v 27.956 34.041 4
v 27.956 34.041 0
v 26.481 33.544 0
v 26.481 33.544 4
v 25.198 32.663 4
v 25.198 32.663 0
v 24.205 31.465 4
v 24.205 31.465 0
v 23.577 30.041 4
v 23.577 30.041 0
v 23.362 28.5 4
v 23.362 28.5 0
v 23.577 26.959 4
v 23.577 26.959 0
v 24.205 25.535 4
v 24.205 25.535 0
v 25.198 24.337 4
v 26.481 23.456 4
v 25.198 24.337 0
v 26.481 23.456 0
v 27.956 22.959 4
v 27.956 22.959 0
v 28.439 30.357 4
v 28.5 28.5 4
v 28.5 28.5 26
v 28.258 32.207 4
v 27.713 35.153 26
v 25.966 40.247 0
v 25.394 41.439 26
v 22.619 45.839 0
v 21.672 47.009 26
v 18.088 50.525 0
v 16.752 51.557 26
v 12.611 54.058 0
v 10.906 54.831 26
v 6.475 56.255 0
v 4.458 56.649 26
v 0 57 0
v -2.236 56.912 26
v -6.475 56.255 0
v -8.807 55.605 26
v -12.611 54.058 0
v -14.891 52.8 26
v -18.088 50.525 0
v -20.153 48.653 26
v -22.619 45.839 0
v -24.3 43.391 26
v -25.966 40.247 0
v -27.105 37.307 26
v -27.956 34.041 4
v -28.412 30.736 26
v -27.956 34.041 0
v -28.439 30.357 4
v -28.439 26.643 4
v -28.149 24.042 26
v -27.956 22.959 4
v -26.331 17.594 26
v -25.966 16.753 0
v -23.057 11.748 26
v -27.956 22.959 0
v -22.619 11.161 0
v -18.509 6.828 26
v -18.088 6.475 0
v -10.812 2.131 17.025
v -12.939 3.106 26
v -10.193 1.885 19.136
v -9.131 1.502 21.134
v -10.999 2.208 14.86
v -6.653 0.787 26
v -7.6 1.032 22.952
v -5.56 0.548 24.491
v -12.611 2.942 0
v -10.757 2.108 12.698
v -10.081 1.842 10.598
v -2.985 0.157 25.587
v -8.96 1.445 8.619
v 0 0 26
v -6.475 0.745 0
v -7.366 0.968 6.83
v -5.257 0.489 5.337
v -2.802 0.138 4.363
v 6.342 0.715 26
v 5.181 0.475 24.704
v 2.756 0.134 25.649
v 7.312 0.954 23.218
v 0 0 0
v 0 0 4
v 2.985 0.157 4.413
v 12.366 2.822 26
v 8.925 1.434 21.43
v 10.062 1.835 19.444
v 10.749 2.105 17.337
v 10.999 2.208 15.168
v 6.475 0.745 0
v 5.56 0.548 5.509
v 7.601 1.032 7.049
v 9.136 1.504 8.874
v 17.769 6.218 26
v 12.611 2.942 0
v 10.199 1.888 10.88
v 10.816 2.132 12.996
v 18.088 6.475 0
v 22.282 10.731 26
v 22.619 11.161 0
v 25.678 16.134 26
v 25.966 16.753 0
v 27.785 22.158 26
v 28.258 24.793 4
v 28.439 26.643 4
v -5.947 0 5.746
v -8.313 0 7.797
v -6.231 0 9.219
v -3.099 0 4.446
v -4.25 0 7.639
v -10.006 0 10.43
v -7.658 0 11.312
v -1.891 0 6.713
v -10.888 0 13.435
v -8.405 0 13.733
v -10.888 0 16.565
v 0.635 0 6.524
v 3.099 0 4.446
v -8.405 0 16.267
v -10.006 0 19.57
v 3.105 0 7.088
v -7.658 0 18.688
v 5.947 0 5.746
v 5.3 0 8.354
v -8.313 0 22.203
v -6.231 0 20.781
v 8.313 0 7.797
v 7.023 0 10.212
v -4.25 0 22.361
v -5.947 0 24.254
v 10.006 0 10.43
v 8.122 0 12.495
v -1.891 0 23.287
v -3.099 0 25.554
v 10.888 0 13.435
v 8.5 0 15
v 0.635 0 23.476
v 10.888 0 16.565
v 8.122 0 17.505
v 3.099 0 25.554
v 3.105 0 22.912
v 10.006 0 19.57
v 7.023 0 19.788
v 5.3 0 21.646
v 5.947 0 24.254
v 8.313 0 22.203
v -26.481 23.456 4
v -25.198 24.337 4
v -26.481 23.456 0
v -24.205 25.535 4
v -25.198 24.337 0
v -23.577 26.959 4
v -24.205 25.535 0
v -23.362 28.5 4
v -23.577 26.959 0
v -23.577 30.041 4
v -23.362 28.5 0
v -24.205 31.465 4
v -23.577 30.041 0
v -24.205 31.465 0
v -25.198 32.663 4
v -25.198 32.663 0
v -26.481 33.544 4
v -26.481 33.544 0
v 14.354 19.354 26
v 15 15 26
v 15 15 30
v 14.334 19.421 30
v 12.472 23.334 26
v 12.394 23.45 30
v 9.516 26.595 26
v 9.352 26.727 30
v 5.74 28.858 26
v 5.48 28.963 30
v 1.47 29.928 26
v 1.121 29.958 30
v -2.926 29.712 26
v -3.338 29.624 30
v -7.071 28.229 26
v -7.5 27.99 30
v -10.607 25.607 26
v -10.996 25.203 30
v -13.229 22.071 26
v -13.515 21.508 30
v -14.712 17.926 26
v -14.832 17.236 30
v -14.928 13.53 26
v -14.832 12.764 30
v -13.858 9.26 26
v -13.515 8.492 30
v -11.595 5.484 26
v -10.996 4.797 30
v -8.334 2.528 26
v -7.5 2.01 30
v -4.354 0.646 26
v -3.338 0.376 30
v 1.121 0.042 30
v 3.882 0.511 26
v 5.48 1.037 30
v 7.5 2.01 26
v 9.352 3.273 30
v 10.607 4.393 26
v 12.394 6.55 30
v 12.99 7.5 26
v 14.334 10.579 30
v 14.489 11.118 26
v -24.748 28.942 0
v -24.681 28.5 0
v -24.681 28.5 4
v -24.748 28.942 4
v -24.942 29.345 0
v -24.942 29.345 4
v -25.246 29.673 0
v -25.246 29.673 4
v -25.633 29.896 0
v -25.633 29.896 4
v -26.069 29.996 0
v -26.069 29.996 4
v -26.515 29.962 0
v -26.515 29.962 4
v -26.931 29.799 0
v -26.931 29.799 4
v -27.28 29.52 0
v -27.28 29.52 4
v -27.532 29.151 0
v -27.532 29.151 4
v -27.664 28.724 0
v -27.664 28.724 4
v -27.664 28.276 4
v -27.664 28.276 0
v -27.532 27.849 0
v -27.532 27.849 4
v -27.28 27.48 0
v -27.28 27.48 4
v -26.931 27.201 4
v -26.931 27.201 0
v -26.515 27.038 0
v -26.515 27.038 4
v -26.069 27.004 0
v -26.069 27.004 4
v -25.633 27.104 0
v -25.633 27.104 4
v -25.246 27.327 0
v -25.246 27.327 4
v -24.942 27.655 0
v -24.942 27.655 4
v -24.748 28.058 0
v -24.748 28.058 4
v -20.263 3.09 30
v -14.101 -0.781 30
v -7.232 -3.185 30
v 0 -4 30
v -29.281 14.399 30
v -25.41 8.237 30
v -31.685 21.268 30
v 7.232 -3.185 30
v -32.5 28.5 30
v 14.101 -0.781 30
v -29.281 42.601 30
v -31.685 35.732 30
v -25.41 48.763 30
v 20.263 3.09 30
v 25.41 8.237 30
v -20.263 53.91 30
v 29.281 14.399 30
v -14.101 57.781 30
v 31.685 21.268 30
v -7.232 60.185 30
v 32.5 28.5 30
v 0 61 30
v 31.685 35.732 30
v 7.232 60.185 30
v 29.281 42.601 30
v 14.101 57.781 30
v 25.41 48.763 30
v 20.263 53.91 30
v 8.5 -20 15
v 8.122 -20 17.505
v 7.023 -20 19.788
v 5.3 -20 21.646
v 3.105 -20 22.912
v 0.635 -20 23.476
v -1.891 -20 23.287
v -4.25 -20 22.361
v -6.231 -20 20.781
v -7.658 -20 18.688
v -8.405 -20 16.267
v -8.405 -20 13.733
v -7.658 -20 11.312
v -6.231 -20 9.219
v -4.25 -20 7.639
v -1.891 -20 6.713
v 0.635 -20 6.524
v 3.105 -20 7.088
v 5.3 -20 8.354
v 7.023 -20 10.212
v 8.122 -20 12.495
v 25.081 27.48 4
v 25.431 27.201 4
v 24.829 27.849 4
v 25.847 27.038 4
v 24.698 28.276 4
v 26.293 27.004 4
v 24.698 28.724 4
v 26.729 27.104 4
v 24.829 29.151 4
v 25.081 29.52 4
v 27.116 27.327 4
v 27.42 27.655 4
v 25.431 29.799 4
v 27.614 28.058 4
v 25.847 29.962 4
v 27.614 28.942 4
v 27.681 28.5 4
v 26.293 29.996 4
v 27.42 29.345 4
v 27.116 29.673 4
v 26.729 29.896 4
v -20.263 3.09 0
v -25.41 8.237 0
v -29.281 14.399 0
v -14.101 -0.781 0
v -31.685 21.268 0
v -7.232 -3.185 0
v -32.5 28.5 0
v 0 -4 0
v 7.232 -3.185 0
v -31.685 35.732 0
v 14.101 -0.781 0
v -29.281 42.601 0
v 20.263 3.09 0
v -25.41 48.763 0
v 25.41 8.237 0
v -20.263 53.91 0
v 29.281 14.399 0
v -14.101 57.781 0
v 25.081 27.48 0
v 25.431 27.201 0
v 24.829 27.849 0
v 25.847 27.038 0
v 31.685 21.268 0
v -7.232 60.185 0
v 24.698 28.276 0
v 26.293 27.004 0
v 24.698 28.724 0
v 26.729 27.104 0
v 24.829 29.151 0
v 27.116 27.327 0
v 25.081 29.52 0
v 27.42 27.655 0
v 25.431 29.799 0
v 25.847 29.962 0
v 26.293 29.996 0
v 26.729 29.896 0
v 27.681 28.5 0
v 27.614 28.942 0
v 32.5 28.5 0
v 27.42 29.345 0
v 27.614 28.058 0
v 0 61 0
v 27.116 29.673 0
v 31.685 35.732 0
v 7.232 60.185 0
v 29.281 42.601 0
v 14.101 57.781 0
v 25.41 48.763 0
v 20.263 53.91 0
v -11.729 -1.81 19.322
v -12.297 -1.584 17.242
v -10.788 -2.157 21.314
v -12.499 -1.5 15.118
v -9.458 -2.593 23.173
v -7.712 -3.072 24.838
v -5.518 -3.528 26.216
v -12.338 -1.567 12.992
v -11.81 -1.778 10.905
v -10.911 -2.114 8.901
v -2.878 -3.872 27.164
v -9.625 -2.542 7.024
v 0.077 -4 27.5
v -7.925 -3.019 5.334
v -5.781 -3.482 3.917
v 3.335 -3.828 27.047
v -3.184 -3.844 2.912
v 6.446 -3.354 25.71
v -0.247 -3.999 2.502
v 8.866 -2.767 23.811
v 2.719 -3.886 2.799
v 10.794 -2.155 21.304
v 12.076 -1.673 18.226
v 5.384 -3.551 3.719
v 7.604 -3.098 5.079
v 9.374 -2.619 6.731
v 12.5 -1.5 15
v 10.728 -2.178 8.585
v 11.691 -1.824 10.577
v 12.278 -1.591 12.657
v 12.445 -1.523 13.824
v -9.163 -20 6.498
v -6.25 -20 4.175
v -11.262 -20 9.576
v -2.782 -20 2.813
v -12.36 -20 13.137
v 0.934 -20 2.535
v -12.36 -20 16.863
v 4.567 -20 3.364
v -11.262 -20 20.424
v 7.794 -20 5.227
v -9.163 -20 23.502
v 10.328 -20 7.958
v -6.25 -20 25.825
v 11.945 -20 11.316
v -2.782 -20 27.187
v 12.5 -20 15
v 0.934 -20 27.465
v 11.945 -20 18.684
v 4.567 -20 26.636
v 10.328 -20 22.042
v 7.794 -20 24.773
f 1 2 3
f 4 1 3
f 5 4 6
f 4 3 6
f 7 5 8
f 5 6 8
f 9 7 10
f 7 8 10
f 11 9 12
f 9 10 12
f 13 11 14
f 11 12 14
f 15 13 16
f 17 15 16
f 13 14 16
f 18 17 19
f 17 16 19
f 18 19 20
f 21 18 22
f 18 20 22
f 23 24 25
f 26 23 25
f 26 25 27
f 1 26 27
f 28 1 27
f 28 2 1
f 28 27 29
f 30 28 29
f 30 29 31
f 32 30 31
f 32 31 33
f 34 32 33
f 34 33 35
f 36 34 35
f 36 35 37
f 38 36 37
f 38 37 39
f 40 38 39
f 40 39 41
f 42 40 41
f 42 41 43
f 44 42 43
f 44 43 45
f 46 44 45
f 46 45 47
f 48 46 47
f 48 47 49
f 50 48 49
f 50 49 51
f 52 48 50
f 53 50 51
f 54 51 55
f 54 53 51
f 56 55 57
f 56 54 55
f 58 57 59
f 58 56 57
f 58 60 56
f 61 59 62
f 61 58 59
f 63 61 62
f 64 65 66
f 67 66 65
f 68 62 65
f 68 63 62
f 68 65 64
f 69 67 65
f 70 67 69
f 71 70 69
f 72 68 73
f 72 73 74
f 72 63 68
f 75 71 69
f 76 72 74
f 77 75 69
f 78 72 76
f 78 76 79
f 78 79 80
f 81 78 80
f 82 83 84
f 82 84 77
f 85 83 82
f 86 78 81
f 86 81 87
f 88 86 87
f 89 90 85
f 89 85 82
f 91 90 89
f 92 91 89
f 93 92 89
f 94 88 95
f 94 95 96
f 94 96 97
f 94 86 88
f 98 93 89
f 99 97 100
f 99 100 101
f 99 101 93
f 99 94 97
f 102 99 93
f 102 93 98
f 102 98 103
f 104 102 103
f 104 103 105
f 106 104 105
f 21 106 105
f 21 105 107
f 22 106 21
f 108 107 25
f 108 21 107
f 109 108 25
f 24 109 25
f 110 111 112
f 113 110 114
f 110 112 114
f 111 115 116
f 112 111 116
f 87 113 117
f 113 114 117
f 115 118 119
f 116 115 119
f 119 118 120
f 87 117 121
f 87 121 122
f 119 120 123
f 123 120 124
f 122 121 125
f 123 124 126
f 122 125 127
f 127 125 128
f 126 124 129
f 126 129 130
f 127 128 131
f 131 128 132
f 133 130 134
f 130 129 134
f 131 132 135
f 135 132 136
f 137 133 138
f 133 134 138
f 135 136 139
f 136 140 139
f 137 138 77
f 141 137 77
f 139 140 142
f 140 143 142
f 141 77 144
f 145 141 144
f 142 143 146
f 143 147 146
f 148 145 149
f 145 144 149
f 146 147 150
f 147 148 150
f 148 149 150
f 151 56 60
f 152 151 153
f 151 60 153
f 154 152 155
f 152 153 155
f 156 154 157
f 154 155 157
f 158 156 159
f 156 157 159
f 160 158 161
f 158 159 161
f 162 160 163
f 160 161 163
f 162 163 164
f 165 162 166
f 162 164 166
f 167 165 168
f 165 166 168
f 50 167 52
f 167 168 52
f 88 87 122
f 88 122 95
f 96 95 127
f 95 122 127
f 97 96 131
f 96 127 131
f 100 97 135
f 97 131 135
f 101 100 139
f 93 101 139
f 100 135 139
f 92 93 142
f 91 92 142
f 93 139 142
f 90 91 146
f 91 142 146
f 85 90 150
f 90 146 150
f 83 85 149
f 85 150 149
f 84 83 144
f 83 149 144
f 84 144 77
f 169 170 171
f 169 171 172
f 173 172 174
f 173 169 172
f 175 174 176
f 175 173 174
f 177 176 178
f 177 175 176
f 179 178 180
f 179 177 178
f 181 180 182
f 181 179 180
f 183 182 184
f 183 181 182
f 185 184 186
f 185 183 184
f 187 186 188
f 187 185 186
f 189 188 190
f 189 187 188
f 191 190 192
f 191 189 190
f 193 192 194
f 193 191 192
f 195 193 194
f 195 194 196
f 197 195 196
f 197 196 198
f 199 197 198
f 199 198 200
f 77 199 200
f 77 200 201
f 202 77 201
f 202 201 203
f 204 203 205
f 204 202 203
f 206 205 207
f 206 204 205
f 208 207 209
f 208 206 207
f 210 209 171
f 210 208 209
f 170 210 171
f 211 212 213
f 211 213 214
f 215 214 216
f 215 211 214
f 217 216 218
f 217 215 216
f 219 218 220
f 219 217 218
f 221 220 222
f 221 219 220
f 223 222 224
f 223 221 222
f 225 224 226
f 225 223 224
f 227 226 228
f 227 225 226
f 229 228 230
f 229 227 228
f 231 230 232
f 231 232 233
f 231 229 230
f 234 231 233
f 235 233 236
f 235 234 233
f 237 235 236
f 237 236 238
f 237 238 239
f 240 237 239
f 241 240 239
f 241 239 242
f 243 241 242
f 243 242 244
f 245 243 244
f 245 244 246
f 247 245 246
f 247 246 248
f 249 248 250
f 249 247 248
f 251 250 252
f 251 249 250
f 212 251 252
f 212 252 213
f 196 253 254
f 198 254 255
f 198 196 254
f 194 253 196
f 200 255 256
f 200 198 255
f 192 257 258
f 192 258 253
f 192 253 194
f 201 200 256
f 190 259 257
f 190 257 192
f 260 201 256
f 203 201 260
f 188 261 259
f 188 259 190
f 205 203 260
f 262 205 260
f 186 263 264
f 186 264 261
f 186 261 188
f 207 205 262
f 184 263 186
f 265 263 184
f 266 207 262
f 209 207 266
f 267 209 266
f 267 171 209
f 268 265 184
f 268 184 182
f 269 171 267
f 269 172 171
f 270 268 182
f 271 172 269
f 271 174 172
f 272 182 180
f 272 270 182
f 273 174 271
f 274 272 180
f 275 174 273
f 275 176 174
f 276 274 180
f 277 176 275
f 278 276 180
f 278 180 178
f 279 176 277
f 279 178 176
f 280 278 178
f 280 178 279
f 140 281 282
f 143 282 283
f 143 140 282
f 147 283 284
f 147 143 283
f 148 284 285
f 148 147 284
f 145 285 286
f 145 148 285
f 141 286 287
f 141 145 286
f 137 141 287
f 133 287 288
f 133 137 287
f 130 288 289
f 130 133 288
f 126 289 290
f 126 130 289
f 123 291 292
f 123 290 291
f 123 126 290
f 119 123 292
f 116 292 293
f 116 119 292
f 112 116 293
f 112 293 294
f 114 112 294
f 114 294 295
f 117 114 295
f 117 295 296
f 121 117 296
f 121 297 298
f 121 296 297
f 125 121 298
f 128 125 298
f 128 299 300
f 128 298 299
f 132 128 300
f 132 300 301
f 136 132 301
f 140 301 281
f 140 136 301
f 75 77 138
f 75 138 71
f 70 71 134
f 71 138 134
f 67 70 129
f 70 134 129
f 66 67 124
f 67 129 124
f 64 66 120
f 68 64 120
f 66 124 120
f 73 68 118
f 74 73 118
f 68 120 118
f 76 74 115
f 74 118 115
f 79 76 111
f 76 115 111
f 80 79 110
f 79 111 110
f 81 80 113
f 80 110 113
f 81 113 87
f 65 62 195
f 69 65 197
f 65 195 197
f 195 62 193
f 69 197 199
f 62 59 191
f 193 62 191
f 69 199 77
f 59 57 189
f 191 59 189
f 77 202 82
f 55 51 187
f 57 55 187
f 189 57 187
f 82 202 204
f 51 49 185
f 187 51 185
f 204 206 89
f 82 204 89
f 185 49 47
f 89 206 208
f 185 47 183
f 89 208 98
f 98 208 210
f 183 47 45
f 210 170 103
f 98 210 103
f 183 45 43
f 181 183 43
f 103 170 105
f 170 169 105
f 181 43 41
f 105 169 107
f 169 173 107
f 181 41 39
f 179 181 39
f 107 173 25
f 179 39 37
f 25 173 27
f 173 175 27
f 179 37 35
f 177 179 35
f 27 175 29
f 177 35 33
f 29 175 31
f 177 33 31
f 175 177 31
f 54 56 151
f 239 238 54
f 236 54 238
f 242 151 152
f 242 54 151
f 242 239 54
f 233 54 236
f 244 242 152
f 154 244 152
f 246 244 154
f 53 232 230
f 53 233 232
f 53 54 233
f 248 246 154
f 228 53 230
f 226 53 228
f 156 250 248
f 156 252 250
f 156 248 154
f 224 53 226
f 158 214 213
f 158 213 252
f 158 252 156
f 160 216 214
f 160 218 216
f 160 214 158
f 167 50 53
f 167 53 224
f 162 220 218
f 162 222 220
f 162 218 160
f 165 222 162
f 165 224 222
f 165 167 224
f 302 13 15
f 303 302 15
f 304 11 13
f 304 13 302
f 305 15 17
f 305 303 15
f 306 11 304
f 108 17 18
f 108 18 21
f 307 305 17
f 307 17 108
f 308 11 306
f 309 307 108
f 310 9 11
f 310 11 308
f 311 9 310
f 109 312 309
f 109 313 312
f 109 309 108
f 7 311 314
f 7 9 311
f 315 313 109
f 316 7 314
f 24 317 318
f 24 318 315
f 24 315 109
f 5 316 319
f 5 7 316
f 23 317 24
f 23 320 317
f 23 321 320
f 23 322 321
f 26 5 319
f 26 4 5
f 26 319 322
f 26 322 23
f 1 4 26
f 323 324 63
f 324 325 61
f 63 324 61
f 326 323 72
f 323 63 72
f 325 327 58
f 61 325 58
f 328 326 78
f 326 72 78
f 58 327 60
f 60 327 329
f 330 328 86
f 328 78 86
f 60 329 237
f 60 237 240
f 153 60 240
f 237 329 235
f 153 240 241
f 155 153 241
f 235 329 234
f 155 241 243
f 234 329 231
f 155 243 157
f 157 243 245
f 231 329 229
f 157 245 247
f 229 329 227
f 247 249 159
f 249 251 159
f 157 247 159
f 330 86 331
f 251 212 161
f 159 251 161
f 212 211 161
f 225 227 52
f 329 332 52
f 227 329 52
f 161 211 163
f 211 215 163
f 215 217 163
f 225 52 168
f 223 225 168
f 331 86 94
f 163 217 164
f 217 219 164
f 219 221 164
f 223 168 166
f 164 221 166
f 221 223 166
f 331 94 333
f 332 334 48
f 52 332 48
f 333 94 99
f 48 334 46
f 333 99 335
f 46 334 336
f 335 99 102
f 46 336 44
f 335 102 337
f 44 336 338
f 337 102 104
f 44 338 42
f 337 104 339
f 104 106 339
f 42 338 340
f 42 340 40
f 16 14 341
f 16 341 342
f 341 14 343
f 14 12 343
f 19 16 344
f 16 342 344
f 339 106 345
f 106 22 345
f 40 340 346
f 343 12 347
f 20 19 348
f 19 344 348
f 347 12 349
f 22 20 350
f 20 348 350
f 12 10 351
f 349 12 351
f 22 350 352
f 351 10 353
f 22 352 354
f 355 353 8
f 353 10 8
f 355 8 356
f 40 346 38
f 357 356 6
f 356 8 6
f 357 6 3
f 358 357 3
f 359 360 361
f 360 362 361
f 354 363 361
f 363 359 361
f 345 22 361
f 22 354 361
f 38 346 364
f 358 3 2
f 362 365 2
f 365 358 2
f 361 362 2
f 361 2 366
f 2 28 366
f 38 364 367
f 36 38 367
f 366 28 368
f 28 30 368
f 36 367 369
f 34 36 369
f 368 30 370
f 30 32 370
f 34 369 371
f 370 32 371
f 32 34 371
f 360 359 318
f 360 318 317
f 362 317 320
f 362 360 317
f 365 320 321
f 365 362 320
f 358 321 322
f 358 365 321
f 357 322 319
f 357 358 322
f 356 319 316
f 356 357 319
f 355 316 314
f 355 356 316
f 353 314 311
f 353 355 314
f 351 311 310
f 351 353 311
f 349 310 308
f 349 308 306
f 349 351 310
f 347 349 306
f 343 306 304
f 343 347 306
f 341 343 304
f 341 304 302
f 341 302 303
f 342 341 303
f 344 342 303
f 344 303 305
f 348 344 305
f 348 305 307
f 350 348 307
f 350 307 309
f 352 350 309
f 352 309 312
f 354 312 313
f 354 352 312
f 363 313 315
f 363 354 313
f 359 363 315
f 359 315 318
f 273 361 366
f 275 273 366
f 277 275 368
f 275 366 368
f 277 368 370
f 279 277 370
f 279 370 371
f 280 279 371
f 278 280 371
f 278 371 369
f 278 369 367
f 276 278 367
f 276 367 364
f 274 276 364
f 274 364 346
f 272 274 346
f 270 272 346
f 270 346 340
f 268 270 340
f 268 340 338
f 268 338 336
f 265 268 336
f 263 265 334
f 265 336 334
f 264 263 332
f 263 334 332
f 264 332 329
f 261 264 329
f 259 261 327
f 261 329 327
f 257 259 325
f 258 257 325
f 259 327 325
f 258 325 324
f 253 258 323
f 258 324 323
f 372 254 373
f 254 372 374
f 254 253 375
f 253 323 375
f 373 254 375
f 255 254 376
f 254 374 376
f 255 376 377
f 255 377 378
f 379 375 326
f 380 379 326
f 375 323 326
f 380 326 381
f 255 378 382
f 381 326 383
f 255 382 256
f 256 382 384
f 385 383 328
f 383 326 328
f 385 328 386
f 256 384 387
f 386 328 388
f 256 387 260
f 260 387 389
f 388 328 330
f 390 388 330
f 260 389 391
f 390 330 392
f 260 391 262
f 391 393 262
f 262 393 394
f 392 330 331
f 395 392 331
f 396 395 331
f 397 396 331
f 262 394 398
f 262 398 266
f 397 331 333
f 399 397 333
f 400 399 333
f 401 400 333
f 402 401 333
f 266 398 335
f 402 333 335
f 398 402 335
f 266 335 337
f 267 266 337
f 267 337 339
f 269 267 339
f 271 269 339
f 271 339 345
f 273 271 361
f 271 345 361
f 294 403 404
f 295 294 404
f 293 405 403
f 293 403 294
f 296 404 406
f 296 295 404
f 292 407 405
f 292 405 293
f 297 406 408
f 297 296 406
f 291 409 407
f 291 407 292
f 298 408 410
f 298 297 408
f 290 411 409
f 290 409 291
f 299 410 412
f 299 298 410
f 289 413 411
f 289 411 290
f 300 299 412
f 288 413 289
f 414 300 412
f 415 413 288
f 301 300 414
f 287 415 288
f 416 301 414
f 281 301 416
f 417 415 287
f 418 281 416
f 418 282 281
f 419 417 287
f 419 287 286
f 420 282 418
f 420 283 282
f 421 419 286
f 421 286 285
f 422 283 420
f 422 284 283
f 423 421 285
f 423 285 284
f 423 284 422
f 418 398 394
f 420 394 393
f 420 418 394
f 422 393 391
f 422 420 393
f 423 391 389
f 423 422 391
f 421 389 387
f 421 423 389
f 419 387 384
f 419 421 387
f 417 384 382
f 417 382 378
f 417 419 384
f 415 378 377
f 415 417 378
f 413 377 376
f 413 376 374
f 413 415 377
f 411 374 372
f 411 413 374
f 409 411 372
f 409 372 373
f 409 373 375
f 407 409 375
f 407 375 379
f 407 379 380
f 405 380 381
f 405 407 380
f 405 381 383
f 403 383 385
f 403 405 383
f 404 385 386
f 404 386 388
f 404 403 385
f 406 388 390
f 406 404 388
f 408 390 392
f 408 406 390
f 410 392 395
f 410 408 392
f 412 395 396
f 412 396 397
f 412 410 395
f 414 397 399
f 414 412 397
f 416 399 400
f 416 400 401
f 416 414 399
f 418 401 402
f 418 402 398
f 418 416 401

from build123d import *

# Parameters (mm, degrees)
F0_R      = 12.5
F1_DEPTH  = 20
F2_R      = 32.5
F3_DEPTH  = 30
F4_R      = 28.5
F5_DEPTH  = 26
F6_R      = 11
F7_DEPTH  = 19.5
F8_R      = 15
F9_DEPTH  = 44.3
F10_R     = 8.5
F11_DEPTH = 41.2
F12_R     = 1.5
F13_DEPTH = 4


with BuildPart() as f1:
    # F0 (on Front) → F1 (new body, symmetric)
    with BuildSketch(Plane.XZ):
        with Locations((0, 15)):
            Circle(F0_R)
    extrude(amount=F1_DEPTH, both=True)

    # F2 (on Top) → F3 (join)
    with BuildSketch(Plane.XY):
        with Locations((0, 28.5)):
            Circle(F2_R)
    extrude(amount=F3_DEPTH)

    # F4 (on Top) → F5 (cut)
    with BuildSketch(Plane.XY):
        with Locations((0, 28.5)):
            Circle(F4_R)
    extrude(amount=F5_DEPTH, mode=Mode.SUBTRACT)

    # F6 (on Front) → F7 (cut)
    with BuildSketch(Plane.XZ):
        with Locations((0, 15)):
            Circle(F6_R)
    extrude(amount=-F7_DEPTH, mode=Mode.SUBTRACT)

    # F8 (on Top) → F9 (cut)
    with BuildSketch(Plane.XY):
        with Locations((0, 15)):
            Circle(F8_R)
    extrude(amount=F9_DEPTH, mode=Mode.SUBTRACT)

    # F10 (on Front) → F11 (cut)
    with BuildSketch(Plane.XZ):
        with Locations((0, 15)):
            Circle(F10_R)
    extrude(amount=F11_DEPTH, mode=Mode.SUBTRACT)

    # F12 (on Top) → F13 (join)
    with BuildSketch(Plane.XY):
        with BuildLine():
            Line((29, 28.5), (29, 34.138157))
            ThreePointArc((29, 34.138157), (23.361843, 28.5), (29, 22.861843))
            Line((29, 22.861843), (29, 28.5))
        make_face()
        with Locations((26.180921, 28.5)):
            Circle(F12_R, mode=Mode.SUBTRACT)
        with BuildLine():
            ThreePointArc((-29, 22.861843), (-23.361843, 28.5), (-29, 34.138157))
            Line((-29, 34.138157), (-29, 28.5))
            Line((-29, 28.5), (-29, 22.861843))
        make_face()
        with Locations((-26.180921, 28.5)):
            Circle(F12_R, mode=Mode.SUBTRACT)
    extrude(amount=F13_DEPTH)


solid = f1.part
